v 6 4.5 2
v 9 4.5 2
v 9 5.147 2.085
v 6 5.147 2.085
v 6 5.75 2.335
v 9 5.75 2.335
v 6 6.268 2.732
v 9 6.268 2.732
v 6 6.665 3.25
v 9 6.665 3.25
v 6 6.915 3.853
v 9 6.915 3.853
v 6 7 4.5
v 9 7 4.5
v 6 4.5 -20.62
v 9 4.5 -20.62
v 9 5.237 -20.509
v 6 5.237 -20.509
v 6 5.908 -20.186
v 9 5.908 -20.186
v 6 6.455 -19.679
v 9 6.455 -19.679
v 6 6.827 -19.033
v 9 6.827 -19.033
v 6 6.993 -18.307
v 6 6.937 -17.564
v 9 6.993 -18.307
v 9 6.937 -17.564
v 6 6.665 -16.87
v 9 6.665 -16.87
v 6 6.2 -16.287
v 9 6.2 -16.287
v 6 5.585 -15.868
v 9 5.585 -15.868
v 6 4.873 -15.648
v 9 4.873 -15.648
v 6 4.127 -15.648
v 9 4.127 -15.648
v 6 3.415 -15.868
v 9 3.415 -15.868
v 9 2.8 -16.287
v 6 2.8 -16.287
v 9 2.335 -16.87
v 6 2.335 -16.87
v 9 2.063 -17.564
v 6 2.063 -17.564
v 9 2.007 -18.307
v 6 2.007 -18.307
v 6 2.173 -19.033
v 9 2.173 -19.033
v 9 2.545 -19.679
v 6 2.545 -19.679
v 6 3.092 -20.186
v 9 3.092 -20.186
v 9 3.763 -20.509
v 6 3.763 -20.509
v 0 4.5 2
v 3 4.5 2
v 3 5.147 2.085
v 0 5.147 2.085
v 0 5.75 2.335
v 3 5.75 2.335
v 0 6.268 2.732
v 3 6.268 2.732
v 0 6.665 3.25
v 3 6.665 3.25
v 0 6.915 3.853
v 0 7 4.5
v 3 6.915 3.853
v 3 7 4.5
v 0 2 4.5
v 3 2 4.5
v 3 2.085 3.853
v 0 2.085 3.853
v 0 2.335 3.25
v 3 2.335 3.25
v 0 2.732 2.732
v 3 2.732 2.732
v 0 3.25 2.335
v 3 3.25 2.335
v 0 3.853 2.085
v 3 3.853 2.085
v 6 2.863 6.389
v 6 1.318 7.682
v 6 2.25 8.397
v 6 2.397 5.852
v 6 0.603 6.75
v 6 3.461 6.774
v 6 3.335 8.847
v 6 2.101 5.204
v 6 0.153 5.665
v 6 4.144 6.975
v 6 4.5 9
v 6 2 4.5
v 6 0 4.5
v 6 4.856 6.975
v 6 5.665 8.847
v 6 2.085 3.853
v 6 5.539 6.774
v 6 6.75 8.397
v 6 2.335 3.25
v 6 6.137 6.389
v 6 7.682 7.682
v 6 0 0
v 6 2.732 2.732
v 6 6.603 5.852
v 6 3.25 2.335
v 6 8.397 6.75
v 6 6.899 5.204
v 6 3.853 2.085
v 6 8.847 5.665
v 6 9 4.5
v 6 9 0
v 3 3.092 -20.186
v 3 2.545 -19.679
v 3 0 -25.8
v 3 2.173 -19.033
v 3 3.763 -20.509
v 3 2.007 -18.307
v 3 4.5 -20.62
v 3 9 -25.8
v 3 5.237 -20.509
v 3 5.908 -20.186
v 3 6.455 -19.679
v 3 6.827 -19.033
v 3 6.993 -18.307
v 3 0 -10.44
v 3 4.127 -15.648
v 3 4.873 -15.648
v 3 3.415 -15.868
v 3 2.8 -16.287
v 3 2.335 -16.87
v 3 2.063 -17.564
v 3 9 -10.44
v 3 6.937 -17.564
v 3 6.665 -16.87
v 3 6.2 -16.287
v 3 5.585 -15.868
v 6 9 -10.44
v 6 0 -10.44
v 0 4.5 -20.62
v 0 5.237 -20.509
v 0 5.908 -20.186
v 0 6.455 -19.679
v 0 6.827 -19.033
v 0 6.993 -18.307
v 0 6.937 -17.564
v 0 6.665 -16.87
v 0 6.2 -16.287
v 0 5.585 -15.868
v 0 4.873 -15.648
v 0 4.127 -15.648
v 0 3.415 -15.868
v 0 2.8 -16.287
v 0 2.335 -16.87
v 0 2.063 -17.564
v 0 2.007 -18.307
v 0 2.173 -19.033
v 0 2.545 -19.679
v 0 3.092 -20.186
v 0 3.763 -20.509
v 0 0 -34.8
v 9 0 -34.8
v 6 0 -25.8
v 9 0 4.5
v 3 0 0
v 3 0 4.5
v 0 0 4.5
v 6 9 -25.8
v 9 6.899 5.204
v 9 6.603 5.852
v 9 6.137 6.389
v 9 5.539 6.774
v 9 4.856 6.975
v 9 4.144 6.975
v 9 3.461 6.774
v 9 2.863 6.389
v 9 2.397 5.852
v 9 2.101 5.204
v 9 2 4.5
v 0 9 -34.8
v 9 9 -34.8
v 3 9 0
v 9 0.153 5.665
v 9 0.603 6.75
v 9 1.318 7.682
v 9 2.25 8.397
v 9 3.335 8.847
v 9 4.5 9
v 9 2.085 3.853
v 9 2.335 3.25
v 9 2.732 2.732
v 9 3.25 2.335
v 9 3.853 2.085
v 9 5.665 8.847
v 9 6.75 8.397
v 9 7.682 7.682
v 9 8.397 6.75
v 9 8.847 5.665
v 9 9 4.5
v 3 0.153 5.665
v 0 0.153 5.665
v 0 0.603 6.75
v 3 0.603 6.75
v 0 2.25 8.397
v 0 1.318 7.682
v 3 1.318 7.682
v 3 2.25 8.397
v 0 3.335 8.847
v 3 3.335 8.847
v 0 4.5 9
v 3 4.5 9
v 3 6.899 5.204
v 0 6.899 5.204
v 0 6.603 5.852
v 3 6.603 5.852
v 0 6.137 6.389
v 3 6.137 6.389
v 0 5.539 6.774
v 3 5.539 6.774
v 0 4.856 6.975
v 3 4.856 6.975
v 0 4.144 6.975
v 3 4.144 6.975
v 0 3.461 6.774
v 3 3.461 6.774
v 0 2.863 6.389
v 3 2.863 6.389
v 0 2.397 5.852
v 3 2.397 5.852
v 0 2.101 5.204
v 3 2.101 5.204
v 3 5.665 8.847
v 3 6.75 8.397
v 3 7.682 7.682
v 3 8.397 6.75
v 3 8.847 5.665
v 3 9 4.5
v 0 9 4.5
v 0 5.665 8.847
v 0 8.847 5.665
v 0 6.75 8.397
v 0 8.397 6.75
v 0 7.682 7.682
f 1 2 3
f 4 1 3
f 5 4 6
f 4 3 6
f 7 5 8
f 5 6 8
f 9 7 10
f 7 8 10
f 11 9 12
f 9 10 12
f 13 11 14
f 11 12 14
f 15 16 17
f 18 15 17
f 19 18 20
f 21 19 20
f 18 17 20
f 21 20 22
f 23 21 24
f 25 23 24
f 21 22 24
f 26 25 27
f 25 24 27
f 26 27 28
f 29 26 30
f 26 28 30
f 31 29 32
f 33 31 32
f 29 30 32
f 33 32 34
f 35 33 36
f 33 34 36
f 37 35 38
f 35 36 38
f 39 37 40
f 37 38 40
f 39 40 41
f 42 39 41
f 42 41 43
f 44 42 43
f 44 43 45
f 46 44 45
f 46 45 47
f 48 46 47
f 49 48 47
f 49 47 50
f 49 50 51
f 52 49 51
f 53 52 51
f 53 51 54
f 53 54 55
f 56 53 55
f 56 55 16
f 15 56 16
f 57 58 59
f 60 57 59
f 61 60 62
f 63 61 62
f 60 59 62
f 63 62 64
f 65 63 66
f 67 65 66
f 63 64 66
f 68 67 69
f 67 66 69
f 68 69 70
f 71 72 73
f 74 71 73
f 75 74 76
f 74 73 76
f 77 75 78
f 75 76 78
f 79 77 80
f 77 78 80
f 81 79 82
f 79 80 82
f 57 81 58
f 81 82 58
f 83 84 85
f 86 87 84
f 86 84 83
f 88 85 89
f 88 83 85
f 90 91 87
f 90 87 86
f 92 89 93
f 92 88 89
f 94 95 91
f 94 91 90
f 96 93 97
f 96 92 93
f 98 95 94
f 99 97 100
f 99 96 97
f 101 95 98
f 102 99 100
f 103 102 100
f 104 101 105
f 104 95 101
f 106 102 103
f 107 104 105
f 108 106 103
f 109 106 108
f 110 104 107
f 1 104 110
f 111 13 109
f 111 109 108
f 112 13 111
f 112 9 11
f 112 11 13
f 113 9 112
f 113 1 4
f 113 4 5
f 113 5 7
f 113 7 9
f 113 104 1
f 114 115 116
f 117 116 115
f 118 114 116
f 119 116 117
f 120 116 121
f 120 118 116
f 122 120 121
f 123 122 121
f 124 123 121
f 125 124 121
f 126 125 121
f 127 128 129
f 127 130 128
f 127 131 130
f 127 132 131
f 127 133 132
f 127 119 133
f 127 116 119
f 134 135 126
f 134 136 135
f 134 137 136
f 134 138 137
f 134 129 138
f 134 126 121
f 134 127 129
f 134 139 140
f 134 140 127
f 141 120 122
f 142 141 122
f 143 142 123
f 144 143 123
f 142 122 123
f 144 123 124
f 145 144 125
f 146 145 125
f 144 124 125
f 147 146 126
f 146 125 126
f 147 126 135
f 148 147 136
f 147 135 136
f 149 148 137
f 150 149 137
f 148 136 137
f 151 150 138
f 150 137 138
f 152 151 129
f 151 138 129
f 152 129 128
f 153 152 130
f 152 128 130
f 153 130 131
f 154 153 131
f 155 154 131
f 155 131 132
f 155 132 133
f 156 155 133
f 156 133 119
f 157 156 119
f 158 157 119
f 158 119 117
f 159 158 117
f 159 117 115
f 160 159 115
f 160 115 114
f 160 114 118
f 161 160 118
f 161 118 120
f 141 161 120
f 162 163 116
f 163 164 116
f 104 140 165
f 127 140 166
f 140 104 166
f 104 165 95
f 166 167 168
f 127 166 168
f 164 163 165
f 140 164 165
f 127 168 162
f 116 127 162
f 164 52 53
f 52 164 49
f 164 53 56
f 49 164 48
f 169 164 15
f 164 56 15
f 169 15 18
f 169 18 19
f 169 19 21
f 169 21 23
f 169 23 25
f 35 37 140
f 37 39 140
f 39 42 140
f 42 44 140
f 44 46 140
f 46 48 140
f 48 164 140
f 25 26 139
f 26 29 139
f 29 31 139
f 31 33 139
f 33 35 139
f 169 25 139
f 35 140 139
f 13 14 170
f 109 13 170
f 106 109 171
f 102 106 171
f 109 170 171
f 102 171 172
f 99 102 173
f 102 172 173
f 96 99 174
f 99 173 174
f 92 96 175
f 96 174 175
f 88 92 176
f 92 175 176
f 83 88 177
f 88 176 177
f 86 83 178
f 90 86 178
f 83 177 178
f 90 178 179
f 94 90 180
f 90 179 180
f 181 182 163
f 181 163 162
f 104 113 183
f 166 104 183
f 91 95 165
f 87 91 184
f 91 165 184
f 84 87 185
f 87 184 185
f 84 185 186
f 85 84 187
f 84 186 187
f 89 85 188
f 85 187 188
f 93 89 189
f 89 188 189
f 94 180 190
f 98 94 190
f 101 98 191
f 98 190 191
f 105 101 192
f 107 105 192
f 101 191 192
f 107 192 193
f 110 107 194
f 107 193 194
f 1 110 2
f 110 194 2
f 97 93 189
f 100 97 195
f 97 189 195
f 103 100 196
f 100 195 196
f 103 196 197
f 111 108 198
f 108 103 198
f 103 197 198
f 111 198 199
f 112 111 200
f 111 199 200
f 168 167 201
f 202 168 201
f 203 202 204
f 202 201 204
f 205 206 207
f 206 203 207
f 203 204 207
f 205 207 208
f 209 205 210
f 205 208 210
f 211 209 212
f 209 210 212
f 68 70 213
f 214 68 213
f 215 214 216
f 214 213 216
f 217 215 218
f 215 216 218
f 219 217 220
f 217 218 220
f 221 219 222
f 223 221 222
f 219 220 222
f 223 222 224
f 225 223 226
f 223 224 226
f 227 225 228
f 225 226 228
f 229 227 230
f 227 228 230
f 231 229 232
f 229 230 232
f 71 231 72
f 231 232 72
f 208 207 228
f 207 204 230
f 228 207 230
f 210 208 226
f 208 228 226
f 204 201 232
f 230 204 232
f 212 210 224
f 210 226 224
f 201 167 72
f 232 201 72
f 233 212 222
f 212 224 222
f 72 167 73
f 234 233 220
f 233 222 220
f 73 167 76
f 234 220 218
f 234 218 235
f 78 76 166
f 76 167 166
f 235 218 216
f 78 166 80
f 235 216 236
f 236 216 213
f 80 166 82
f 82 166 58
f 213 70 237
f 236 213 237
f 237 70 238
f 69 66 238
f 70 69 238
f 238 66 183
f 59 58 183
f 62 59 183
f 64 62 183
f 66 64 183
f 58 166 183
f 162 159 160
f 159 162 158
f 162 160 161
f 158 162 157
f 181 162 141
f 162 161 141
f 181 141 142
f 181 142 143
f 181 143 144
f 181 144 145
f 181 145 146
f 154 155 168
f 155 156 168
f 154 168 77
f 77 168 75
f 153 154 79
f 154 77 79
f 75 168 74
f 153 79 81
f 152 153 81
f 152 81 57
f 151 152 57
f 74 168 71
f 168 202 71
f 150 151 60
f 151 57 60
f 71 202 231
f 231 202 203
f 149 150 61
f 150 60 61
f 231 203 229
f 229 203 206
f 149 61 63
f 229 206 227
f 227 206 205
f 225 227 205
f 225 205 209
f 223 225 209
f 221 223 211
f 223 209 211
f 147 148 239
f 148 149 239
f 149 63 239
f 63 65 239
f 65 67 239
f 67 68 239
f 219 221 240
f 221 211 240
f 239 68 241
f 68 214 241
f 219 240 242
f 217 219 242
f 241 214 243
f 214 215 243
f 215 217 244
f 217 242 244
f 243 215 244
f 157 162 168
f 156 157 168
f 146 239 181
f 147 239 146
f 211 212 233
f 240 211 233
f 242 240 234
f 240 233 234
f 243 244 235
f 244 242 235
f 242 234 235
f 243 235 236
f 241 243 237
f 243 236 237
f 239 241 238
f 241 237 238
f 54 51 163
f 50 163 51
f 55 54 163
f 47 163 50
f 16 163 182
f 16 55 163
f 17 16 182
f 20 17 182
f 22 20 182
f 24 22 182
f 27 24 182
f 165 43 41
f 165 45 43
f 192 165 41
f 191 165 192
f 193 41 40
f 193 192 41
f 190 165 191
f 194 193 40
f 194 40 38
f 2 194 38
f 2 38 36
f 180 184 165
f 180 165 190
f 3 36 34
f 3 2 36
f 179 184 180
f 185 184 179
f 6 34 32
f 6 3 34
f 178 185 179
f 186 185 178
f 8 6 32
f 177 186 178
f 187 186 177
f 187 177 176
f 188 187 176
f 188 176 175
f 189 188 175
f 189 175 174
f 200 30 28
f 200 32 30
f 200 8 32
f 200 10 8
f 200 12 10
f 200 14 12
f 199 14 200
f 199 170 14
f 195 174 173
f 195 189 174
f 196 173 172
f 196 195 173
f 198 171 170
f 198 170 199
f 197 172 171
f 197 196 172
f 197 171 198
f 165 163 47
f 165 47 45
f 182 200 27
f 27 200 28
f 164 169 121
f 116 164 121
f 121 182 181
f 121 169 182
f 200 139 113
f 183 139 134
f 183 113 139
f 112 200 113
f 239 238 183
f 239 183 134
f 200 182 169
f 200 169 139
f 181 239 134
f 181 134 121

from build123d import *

# Parameters (mm, degrees)
SKETCH1_W             = 3
SKETCH1_H             = 9
BOSS_EXTRUDE1_DEPTH   = 9
BOSS_EXTRUDE1_2_DEPTH = 9
SKETCH2_W             = 9
SKETCH2_H             = 9
BOSS_EXTRUDE2_DEPTH   = 10.44
SKETCH3_W             = 3
SKETCH3_H             = 9
BOSS_EXTRUDE3_DEPTH   = 15.36
SKETCH4_W             = 9
SKETCH4_H             = 9
BOSS_EXTRUDE4_DEPTH   = 9
SKETCH5_R             = 2.5
CUT_EXTRUDE1_DEPTH    = 38.054554376
CUT_EXTRUDE5_DEPTH    = 38.054554376


with BuildPart() as part:
    # Sketch1 → Boss-Extrude1 (new body)
    with BuildSketch(Plane.XY):
        with Locations((1.5, 4.5)):
            Rectangle(SKETCH1_W, SKETCH1_H)
    extrude(amount=BOSS_EXTRUDE1_DEPTH)



with BuildPart() as body_2:
    # Sketch1 → Boss-Extrude1 2 (new body)
    with BuildSketch(Plane.XY):
        with Locations((7.5, 4.5)):
            Rectangle(SKETCH1_W, SKETCH1_H)
    extrude(amount=BOSS_EXTRUDE1_2_DEPTH)


with BuildPart() as part_1:
    add(part.part)

    add(body_2.part)  # Boss-Extrude2 merges body 2
    # Sketch2 → Boss-Extrude2 (add)
    with BuildSketch(Plane(origin=(0, 0, 0), x_dir=(-1, 0, 0), z_dir=(0, 0, -1))):
        with Locations((-4.5, 4.5)):
            Rectangle(SKETCH2_W, SKETCH2_H)
    extrude(amount=BOSS_EXTRUDE2_DEPTH)

    # Sketch3 → Boss-Extrude3 (add)
    with BuildSketch(Plane(origin=(0, 0, -10.44), x_dir=(-1, 0, 0), z_dir=(0, 0, -1))):
        with Locations((-7.5, 4.5)):
            Rectangle(SKETCH3_W, SKETCH3_H)
        with Locations((-1.5, 4.5)):
            Rectangle(SKETCH3_W, SKETCH3_H)
    extrude(amount=BOSS_EXTRUDE3_DEPTH)

    # Sketch4 → Boss-Extrude4 (add)
    with BuildSketch(Plane(origin=(0, 0, -25.8), x_dir=(-1, 0, 0), z_dir=(0, 0, -1))):
        with Locations((-4.5, 4.5)):
            Rectangle(SKETCH4_W, SKETCH4_H)
    extrude(amount=BOSS_EXTRUDE4_DEPTH)

    # Sketch5 → Cut-Extrude1 (cut, through all)
    with BuildSketch(Plane(origin=(9, 0, 0), x_dir=(0, 0, -1), z_dir=(1, 0, 0))):
        with Locations((18.12, 4.5)):
            Circle(SKETCH5_R)
    extrude(amount=-CUT_EXTRUDE1_DEPTH, mode=Mode.SUBTRACT)

    # Sketch6 → Cut-Extrude5 (cut, through all)
    with BuildSketch(Plane(origin=(9, 0, 0), x_dir=(0, 0, -1), z_dir=(1, 0, 0))):
        with BuildLine():
            ThreePointArc((-9, 4.5), (-7.681980515, 7.681980515), (-4.5, 9))
            Line((-4.5, 9), (-9, 9))
            Line((-9, 9), (-9, 4.5))
        make_face()
        with BuildLine():
            ThreePointArc((-4.5, 0), (-7.681980515, 1.318019485), (-9, 4.5))
            Line((-9, 4.5), (-9, 0))
            Line((-9, 0), (-4.5, 0))
        make_face()
        with BuildLine():
            ThreePointArc((-2, 4.5), (-2.732233047, 6.267766953), (-4.5, 7))
            Line((-4.5, 7), (-4.5, 2))
            ThreePointArc((-4.5, 2), (-2.732233047, 2.732233047), (-2, 4.5))
        make_face()
        with BuildLine():
            Line((-4.5, 2), (-4.5, 7))
            ThreePointArc((-4.5, 7), (-7, 4.5), (-4.5, 2))
        make_face()
    extrude(amount=-CUT_EXTRUDE5_DEPTH, mode=Mode.SUBTRACT)


solid = part_1.part
